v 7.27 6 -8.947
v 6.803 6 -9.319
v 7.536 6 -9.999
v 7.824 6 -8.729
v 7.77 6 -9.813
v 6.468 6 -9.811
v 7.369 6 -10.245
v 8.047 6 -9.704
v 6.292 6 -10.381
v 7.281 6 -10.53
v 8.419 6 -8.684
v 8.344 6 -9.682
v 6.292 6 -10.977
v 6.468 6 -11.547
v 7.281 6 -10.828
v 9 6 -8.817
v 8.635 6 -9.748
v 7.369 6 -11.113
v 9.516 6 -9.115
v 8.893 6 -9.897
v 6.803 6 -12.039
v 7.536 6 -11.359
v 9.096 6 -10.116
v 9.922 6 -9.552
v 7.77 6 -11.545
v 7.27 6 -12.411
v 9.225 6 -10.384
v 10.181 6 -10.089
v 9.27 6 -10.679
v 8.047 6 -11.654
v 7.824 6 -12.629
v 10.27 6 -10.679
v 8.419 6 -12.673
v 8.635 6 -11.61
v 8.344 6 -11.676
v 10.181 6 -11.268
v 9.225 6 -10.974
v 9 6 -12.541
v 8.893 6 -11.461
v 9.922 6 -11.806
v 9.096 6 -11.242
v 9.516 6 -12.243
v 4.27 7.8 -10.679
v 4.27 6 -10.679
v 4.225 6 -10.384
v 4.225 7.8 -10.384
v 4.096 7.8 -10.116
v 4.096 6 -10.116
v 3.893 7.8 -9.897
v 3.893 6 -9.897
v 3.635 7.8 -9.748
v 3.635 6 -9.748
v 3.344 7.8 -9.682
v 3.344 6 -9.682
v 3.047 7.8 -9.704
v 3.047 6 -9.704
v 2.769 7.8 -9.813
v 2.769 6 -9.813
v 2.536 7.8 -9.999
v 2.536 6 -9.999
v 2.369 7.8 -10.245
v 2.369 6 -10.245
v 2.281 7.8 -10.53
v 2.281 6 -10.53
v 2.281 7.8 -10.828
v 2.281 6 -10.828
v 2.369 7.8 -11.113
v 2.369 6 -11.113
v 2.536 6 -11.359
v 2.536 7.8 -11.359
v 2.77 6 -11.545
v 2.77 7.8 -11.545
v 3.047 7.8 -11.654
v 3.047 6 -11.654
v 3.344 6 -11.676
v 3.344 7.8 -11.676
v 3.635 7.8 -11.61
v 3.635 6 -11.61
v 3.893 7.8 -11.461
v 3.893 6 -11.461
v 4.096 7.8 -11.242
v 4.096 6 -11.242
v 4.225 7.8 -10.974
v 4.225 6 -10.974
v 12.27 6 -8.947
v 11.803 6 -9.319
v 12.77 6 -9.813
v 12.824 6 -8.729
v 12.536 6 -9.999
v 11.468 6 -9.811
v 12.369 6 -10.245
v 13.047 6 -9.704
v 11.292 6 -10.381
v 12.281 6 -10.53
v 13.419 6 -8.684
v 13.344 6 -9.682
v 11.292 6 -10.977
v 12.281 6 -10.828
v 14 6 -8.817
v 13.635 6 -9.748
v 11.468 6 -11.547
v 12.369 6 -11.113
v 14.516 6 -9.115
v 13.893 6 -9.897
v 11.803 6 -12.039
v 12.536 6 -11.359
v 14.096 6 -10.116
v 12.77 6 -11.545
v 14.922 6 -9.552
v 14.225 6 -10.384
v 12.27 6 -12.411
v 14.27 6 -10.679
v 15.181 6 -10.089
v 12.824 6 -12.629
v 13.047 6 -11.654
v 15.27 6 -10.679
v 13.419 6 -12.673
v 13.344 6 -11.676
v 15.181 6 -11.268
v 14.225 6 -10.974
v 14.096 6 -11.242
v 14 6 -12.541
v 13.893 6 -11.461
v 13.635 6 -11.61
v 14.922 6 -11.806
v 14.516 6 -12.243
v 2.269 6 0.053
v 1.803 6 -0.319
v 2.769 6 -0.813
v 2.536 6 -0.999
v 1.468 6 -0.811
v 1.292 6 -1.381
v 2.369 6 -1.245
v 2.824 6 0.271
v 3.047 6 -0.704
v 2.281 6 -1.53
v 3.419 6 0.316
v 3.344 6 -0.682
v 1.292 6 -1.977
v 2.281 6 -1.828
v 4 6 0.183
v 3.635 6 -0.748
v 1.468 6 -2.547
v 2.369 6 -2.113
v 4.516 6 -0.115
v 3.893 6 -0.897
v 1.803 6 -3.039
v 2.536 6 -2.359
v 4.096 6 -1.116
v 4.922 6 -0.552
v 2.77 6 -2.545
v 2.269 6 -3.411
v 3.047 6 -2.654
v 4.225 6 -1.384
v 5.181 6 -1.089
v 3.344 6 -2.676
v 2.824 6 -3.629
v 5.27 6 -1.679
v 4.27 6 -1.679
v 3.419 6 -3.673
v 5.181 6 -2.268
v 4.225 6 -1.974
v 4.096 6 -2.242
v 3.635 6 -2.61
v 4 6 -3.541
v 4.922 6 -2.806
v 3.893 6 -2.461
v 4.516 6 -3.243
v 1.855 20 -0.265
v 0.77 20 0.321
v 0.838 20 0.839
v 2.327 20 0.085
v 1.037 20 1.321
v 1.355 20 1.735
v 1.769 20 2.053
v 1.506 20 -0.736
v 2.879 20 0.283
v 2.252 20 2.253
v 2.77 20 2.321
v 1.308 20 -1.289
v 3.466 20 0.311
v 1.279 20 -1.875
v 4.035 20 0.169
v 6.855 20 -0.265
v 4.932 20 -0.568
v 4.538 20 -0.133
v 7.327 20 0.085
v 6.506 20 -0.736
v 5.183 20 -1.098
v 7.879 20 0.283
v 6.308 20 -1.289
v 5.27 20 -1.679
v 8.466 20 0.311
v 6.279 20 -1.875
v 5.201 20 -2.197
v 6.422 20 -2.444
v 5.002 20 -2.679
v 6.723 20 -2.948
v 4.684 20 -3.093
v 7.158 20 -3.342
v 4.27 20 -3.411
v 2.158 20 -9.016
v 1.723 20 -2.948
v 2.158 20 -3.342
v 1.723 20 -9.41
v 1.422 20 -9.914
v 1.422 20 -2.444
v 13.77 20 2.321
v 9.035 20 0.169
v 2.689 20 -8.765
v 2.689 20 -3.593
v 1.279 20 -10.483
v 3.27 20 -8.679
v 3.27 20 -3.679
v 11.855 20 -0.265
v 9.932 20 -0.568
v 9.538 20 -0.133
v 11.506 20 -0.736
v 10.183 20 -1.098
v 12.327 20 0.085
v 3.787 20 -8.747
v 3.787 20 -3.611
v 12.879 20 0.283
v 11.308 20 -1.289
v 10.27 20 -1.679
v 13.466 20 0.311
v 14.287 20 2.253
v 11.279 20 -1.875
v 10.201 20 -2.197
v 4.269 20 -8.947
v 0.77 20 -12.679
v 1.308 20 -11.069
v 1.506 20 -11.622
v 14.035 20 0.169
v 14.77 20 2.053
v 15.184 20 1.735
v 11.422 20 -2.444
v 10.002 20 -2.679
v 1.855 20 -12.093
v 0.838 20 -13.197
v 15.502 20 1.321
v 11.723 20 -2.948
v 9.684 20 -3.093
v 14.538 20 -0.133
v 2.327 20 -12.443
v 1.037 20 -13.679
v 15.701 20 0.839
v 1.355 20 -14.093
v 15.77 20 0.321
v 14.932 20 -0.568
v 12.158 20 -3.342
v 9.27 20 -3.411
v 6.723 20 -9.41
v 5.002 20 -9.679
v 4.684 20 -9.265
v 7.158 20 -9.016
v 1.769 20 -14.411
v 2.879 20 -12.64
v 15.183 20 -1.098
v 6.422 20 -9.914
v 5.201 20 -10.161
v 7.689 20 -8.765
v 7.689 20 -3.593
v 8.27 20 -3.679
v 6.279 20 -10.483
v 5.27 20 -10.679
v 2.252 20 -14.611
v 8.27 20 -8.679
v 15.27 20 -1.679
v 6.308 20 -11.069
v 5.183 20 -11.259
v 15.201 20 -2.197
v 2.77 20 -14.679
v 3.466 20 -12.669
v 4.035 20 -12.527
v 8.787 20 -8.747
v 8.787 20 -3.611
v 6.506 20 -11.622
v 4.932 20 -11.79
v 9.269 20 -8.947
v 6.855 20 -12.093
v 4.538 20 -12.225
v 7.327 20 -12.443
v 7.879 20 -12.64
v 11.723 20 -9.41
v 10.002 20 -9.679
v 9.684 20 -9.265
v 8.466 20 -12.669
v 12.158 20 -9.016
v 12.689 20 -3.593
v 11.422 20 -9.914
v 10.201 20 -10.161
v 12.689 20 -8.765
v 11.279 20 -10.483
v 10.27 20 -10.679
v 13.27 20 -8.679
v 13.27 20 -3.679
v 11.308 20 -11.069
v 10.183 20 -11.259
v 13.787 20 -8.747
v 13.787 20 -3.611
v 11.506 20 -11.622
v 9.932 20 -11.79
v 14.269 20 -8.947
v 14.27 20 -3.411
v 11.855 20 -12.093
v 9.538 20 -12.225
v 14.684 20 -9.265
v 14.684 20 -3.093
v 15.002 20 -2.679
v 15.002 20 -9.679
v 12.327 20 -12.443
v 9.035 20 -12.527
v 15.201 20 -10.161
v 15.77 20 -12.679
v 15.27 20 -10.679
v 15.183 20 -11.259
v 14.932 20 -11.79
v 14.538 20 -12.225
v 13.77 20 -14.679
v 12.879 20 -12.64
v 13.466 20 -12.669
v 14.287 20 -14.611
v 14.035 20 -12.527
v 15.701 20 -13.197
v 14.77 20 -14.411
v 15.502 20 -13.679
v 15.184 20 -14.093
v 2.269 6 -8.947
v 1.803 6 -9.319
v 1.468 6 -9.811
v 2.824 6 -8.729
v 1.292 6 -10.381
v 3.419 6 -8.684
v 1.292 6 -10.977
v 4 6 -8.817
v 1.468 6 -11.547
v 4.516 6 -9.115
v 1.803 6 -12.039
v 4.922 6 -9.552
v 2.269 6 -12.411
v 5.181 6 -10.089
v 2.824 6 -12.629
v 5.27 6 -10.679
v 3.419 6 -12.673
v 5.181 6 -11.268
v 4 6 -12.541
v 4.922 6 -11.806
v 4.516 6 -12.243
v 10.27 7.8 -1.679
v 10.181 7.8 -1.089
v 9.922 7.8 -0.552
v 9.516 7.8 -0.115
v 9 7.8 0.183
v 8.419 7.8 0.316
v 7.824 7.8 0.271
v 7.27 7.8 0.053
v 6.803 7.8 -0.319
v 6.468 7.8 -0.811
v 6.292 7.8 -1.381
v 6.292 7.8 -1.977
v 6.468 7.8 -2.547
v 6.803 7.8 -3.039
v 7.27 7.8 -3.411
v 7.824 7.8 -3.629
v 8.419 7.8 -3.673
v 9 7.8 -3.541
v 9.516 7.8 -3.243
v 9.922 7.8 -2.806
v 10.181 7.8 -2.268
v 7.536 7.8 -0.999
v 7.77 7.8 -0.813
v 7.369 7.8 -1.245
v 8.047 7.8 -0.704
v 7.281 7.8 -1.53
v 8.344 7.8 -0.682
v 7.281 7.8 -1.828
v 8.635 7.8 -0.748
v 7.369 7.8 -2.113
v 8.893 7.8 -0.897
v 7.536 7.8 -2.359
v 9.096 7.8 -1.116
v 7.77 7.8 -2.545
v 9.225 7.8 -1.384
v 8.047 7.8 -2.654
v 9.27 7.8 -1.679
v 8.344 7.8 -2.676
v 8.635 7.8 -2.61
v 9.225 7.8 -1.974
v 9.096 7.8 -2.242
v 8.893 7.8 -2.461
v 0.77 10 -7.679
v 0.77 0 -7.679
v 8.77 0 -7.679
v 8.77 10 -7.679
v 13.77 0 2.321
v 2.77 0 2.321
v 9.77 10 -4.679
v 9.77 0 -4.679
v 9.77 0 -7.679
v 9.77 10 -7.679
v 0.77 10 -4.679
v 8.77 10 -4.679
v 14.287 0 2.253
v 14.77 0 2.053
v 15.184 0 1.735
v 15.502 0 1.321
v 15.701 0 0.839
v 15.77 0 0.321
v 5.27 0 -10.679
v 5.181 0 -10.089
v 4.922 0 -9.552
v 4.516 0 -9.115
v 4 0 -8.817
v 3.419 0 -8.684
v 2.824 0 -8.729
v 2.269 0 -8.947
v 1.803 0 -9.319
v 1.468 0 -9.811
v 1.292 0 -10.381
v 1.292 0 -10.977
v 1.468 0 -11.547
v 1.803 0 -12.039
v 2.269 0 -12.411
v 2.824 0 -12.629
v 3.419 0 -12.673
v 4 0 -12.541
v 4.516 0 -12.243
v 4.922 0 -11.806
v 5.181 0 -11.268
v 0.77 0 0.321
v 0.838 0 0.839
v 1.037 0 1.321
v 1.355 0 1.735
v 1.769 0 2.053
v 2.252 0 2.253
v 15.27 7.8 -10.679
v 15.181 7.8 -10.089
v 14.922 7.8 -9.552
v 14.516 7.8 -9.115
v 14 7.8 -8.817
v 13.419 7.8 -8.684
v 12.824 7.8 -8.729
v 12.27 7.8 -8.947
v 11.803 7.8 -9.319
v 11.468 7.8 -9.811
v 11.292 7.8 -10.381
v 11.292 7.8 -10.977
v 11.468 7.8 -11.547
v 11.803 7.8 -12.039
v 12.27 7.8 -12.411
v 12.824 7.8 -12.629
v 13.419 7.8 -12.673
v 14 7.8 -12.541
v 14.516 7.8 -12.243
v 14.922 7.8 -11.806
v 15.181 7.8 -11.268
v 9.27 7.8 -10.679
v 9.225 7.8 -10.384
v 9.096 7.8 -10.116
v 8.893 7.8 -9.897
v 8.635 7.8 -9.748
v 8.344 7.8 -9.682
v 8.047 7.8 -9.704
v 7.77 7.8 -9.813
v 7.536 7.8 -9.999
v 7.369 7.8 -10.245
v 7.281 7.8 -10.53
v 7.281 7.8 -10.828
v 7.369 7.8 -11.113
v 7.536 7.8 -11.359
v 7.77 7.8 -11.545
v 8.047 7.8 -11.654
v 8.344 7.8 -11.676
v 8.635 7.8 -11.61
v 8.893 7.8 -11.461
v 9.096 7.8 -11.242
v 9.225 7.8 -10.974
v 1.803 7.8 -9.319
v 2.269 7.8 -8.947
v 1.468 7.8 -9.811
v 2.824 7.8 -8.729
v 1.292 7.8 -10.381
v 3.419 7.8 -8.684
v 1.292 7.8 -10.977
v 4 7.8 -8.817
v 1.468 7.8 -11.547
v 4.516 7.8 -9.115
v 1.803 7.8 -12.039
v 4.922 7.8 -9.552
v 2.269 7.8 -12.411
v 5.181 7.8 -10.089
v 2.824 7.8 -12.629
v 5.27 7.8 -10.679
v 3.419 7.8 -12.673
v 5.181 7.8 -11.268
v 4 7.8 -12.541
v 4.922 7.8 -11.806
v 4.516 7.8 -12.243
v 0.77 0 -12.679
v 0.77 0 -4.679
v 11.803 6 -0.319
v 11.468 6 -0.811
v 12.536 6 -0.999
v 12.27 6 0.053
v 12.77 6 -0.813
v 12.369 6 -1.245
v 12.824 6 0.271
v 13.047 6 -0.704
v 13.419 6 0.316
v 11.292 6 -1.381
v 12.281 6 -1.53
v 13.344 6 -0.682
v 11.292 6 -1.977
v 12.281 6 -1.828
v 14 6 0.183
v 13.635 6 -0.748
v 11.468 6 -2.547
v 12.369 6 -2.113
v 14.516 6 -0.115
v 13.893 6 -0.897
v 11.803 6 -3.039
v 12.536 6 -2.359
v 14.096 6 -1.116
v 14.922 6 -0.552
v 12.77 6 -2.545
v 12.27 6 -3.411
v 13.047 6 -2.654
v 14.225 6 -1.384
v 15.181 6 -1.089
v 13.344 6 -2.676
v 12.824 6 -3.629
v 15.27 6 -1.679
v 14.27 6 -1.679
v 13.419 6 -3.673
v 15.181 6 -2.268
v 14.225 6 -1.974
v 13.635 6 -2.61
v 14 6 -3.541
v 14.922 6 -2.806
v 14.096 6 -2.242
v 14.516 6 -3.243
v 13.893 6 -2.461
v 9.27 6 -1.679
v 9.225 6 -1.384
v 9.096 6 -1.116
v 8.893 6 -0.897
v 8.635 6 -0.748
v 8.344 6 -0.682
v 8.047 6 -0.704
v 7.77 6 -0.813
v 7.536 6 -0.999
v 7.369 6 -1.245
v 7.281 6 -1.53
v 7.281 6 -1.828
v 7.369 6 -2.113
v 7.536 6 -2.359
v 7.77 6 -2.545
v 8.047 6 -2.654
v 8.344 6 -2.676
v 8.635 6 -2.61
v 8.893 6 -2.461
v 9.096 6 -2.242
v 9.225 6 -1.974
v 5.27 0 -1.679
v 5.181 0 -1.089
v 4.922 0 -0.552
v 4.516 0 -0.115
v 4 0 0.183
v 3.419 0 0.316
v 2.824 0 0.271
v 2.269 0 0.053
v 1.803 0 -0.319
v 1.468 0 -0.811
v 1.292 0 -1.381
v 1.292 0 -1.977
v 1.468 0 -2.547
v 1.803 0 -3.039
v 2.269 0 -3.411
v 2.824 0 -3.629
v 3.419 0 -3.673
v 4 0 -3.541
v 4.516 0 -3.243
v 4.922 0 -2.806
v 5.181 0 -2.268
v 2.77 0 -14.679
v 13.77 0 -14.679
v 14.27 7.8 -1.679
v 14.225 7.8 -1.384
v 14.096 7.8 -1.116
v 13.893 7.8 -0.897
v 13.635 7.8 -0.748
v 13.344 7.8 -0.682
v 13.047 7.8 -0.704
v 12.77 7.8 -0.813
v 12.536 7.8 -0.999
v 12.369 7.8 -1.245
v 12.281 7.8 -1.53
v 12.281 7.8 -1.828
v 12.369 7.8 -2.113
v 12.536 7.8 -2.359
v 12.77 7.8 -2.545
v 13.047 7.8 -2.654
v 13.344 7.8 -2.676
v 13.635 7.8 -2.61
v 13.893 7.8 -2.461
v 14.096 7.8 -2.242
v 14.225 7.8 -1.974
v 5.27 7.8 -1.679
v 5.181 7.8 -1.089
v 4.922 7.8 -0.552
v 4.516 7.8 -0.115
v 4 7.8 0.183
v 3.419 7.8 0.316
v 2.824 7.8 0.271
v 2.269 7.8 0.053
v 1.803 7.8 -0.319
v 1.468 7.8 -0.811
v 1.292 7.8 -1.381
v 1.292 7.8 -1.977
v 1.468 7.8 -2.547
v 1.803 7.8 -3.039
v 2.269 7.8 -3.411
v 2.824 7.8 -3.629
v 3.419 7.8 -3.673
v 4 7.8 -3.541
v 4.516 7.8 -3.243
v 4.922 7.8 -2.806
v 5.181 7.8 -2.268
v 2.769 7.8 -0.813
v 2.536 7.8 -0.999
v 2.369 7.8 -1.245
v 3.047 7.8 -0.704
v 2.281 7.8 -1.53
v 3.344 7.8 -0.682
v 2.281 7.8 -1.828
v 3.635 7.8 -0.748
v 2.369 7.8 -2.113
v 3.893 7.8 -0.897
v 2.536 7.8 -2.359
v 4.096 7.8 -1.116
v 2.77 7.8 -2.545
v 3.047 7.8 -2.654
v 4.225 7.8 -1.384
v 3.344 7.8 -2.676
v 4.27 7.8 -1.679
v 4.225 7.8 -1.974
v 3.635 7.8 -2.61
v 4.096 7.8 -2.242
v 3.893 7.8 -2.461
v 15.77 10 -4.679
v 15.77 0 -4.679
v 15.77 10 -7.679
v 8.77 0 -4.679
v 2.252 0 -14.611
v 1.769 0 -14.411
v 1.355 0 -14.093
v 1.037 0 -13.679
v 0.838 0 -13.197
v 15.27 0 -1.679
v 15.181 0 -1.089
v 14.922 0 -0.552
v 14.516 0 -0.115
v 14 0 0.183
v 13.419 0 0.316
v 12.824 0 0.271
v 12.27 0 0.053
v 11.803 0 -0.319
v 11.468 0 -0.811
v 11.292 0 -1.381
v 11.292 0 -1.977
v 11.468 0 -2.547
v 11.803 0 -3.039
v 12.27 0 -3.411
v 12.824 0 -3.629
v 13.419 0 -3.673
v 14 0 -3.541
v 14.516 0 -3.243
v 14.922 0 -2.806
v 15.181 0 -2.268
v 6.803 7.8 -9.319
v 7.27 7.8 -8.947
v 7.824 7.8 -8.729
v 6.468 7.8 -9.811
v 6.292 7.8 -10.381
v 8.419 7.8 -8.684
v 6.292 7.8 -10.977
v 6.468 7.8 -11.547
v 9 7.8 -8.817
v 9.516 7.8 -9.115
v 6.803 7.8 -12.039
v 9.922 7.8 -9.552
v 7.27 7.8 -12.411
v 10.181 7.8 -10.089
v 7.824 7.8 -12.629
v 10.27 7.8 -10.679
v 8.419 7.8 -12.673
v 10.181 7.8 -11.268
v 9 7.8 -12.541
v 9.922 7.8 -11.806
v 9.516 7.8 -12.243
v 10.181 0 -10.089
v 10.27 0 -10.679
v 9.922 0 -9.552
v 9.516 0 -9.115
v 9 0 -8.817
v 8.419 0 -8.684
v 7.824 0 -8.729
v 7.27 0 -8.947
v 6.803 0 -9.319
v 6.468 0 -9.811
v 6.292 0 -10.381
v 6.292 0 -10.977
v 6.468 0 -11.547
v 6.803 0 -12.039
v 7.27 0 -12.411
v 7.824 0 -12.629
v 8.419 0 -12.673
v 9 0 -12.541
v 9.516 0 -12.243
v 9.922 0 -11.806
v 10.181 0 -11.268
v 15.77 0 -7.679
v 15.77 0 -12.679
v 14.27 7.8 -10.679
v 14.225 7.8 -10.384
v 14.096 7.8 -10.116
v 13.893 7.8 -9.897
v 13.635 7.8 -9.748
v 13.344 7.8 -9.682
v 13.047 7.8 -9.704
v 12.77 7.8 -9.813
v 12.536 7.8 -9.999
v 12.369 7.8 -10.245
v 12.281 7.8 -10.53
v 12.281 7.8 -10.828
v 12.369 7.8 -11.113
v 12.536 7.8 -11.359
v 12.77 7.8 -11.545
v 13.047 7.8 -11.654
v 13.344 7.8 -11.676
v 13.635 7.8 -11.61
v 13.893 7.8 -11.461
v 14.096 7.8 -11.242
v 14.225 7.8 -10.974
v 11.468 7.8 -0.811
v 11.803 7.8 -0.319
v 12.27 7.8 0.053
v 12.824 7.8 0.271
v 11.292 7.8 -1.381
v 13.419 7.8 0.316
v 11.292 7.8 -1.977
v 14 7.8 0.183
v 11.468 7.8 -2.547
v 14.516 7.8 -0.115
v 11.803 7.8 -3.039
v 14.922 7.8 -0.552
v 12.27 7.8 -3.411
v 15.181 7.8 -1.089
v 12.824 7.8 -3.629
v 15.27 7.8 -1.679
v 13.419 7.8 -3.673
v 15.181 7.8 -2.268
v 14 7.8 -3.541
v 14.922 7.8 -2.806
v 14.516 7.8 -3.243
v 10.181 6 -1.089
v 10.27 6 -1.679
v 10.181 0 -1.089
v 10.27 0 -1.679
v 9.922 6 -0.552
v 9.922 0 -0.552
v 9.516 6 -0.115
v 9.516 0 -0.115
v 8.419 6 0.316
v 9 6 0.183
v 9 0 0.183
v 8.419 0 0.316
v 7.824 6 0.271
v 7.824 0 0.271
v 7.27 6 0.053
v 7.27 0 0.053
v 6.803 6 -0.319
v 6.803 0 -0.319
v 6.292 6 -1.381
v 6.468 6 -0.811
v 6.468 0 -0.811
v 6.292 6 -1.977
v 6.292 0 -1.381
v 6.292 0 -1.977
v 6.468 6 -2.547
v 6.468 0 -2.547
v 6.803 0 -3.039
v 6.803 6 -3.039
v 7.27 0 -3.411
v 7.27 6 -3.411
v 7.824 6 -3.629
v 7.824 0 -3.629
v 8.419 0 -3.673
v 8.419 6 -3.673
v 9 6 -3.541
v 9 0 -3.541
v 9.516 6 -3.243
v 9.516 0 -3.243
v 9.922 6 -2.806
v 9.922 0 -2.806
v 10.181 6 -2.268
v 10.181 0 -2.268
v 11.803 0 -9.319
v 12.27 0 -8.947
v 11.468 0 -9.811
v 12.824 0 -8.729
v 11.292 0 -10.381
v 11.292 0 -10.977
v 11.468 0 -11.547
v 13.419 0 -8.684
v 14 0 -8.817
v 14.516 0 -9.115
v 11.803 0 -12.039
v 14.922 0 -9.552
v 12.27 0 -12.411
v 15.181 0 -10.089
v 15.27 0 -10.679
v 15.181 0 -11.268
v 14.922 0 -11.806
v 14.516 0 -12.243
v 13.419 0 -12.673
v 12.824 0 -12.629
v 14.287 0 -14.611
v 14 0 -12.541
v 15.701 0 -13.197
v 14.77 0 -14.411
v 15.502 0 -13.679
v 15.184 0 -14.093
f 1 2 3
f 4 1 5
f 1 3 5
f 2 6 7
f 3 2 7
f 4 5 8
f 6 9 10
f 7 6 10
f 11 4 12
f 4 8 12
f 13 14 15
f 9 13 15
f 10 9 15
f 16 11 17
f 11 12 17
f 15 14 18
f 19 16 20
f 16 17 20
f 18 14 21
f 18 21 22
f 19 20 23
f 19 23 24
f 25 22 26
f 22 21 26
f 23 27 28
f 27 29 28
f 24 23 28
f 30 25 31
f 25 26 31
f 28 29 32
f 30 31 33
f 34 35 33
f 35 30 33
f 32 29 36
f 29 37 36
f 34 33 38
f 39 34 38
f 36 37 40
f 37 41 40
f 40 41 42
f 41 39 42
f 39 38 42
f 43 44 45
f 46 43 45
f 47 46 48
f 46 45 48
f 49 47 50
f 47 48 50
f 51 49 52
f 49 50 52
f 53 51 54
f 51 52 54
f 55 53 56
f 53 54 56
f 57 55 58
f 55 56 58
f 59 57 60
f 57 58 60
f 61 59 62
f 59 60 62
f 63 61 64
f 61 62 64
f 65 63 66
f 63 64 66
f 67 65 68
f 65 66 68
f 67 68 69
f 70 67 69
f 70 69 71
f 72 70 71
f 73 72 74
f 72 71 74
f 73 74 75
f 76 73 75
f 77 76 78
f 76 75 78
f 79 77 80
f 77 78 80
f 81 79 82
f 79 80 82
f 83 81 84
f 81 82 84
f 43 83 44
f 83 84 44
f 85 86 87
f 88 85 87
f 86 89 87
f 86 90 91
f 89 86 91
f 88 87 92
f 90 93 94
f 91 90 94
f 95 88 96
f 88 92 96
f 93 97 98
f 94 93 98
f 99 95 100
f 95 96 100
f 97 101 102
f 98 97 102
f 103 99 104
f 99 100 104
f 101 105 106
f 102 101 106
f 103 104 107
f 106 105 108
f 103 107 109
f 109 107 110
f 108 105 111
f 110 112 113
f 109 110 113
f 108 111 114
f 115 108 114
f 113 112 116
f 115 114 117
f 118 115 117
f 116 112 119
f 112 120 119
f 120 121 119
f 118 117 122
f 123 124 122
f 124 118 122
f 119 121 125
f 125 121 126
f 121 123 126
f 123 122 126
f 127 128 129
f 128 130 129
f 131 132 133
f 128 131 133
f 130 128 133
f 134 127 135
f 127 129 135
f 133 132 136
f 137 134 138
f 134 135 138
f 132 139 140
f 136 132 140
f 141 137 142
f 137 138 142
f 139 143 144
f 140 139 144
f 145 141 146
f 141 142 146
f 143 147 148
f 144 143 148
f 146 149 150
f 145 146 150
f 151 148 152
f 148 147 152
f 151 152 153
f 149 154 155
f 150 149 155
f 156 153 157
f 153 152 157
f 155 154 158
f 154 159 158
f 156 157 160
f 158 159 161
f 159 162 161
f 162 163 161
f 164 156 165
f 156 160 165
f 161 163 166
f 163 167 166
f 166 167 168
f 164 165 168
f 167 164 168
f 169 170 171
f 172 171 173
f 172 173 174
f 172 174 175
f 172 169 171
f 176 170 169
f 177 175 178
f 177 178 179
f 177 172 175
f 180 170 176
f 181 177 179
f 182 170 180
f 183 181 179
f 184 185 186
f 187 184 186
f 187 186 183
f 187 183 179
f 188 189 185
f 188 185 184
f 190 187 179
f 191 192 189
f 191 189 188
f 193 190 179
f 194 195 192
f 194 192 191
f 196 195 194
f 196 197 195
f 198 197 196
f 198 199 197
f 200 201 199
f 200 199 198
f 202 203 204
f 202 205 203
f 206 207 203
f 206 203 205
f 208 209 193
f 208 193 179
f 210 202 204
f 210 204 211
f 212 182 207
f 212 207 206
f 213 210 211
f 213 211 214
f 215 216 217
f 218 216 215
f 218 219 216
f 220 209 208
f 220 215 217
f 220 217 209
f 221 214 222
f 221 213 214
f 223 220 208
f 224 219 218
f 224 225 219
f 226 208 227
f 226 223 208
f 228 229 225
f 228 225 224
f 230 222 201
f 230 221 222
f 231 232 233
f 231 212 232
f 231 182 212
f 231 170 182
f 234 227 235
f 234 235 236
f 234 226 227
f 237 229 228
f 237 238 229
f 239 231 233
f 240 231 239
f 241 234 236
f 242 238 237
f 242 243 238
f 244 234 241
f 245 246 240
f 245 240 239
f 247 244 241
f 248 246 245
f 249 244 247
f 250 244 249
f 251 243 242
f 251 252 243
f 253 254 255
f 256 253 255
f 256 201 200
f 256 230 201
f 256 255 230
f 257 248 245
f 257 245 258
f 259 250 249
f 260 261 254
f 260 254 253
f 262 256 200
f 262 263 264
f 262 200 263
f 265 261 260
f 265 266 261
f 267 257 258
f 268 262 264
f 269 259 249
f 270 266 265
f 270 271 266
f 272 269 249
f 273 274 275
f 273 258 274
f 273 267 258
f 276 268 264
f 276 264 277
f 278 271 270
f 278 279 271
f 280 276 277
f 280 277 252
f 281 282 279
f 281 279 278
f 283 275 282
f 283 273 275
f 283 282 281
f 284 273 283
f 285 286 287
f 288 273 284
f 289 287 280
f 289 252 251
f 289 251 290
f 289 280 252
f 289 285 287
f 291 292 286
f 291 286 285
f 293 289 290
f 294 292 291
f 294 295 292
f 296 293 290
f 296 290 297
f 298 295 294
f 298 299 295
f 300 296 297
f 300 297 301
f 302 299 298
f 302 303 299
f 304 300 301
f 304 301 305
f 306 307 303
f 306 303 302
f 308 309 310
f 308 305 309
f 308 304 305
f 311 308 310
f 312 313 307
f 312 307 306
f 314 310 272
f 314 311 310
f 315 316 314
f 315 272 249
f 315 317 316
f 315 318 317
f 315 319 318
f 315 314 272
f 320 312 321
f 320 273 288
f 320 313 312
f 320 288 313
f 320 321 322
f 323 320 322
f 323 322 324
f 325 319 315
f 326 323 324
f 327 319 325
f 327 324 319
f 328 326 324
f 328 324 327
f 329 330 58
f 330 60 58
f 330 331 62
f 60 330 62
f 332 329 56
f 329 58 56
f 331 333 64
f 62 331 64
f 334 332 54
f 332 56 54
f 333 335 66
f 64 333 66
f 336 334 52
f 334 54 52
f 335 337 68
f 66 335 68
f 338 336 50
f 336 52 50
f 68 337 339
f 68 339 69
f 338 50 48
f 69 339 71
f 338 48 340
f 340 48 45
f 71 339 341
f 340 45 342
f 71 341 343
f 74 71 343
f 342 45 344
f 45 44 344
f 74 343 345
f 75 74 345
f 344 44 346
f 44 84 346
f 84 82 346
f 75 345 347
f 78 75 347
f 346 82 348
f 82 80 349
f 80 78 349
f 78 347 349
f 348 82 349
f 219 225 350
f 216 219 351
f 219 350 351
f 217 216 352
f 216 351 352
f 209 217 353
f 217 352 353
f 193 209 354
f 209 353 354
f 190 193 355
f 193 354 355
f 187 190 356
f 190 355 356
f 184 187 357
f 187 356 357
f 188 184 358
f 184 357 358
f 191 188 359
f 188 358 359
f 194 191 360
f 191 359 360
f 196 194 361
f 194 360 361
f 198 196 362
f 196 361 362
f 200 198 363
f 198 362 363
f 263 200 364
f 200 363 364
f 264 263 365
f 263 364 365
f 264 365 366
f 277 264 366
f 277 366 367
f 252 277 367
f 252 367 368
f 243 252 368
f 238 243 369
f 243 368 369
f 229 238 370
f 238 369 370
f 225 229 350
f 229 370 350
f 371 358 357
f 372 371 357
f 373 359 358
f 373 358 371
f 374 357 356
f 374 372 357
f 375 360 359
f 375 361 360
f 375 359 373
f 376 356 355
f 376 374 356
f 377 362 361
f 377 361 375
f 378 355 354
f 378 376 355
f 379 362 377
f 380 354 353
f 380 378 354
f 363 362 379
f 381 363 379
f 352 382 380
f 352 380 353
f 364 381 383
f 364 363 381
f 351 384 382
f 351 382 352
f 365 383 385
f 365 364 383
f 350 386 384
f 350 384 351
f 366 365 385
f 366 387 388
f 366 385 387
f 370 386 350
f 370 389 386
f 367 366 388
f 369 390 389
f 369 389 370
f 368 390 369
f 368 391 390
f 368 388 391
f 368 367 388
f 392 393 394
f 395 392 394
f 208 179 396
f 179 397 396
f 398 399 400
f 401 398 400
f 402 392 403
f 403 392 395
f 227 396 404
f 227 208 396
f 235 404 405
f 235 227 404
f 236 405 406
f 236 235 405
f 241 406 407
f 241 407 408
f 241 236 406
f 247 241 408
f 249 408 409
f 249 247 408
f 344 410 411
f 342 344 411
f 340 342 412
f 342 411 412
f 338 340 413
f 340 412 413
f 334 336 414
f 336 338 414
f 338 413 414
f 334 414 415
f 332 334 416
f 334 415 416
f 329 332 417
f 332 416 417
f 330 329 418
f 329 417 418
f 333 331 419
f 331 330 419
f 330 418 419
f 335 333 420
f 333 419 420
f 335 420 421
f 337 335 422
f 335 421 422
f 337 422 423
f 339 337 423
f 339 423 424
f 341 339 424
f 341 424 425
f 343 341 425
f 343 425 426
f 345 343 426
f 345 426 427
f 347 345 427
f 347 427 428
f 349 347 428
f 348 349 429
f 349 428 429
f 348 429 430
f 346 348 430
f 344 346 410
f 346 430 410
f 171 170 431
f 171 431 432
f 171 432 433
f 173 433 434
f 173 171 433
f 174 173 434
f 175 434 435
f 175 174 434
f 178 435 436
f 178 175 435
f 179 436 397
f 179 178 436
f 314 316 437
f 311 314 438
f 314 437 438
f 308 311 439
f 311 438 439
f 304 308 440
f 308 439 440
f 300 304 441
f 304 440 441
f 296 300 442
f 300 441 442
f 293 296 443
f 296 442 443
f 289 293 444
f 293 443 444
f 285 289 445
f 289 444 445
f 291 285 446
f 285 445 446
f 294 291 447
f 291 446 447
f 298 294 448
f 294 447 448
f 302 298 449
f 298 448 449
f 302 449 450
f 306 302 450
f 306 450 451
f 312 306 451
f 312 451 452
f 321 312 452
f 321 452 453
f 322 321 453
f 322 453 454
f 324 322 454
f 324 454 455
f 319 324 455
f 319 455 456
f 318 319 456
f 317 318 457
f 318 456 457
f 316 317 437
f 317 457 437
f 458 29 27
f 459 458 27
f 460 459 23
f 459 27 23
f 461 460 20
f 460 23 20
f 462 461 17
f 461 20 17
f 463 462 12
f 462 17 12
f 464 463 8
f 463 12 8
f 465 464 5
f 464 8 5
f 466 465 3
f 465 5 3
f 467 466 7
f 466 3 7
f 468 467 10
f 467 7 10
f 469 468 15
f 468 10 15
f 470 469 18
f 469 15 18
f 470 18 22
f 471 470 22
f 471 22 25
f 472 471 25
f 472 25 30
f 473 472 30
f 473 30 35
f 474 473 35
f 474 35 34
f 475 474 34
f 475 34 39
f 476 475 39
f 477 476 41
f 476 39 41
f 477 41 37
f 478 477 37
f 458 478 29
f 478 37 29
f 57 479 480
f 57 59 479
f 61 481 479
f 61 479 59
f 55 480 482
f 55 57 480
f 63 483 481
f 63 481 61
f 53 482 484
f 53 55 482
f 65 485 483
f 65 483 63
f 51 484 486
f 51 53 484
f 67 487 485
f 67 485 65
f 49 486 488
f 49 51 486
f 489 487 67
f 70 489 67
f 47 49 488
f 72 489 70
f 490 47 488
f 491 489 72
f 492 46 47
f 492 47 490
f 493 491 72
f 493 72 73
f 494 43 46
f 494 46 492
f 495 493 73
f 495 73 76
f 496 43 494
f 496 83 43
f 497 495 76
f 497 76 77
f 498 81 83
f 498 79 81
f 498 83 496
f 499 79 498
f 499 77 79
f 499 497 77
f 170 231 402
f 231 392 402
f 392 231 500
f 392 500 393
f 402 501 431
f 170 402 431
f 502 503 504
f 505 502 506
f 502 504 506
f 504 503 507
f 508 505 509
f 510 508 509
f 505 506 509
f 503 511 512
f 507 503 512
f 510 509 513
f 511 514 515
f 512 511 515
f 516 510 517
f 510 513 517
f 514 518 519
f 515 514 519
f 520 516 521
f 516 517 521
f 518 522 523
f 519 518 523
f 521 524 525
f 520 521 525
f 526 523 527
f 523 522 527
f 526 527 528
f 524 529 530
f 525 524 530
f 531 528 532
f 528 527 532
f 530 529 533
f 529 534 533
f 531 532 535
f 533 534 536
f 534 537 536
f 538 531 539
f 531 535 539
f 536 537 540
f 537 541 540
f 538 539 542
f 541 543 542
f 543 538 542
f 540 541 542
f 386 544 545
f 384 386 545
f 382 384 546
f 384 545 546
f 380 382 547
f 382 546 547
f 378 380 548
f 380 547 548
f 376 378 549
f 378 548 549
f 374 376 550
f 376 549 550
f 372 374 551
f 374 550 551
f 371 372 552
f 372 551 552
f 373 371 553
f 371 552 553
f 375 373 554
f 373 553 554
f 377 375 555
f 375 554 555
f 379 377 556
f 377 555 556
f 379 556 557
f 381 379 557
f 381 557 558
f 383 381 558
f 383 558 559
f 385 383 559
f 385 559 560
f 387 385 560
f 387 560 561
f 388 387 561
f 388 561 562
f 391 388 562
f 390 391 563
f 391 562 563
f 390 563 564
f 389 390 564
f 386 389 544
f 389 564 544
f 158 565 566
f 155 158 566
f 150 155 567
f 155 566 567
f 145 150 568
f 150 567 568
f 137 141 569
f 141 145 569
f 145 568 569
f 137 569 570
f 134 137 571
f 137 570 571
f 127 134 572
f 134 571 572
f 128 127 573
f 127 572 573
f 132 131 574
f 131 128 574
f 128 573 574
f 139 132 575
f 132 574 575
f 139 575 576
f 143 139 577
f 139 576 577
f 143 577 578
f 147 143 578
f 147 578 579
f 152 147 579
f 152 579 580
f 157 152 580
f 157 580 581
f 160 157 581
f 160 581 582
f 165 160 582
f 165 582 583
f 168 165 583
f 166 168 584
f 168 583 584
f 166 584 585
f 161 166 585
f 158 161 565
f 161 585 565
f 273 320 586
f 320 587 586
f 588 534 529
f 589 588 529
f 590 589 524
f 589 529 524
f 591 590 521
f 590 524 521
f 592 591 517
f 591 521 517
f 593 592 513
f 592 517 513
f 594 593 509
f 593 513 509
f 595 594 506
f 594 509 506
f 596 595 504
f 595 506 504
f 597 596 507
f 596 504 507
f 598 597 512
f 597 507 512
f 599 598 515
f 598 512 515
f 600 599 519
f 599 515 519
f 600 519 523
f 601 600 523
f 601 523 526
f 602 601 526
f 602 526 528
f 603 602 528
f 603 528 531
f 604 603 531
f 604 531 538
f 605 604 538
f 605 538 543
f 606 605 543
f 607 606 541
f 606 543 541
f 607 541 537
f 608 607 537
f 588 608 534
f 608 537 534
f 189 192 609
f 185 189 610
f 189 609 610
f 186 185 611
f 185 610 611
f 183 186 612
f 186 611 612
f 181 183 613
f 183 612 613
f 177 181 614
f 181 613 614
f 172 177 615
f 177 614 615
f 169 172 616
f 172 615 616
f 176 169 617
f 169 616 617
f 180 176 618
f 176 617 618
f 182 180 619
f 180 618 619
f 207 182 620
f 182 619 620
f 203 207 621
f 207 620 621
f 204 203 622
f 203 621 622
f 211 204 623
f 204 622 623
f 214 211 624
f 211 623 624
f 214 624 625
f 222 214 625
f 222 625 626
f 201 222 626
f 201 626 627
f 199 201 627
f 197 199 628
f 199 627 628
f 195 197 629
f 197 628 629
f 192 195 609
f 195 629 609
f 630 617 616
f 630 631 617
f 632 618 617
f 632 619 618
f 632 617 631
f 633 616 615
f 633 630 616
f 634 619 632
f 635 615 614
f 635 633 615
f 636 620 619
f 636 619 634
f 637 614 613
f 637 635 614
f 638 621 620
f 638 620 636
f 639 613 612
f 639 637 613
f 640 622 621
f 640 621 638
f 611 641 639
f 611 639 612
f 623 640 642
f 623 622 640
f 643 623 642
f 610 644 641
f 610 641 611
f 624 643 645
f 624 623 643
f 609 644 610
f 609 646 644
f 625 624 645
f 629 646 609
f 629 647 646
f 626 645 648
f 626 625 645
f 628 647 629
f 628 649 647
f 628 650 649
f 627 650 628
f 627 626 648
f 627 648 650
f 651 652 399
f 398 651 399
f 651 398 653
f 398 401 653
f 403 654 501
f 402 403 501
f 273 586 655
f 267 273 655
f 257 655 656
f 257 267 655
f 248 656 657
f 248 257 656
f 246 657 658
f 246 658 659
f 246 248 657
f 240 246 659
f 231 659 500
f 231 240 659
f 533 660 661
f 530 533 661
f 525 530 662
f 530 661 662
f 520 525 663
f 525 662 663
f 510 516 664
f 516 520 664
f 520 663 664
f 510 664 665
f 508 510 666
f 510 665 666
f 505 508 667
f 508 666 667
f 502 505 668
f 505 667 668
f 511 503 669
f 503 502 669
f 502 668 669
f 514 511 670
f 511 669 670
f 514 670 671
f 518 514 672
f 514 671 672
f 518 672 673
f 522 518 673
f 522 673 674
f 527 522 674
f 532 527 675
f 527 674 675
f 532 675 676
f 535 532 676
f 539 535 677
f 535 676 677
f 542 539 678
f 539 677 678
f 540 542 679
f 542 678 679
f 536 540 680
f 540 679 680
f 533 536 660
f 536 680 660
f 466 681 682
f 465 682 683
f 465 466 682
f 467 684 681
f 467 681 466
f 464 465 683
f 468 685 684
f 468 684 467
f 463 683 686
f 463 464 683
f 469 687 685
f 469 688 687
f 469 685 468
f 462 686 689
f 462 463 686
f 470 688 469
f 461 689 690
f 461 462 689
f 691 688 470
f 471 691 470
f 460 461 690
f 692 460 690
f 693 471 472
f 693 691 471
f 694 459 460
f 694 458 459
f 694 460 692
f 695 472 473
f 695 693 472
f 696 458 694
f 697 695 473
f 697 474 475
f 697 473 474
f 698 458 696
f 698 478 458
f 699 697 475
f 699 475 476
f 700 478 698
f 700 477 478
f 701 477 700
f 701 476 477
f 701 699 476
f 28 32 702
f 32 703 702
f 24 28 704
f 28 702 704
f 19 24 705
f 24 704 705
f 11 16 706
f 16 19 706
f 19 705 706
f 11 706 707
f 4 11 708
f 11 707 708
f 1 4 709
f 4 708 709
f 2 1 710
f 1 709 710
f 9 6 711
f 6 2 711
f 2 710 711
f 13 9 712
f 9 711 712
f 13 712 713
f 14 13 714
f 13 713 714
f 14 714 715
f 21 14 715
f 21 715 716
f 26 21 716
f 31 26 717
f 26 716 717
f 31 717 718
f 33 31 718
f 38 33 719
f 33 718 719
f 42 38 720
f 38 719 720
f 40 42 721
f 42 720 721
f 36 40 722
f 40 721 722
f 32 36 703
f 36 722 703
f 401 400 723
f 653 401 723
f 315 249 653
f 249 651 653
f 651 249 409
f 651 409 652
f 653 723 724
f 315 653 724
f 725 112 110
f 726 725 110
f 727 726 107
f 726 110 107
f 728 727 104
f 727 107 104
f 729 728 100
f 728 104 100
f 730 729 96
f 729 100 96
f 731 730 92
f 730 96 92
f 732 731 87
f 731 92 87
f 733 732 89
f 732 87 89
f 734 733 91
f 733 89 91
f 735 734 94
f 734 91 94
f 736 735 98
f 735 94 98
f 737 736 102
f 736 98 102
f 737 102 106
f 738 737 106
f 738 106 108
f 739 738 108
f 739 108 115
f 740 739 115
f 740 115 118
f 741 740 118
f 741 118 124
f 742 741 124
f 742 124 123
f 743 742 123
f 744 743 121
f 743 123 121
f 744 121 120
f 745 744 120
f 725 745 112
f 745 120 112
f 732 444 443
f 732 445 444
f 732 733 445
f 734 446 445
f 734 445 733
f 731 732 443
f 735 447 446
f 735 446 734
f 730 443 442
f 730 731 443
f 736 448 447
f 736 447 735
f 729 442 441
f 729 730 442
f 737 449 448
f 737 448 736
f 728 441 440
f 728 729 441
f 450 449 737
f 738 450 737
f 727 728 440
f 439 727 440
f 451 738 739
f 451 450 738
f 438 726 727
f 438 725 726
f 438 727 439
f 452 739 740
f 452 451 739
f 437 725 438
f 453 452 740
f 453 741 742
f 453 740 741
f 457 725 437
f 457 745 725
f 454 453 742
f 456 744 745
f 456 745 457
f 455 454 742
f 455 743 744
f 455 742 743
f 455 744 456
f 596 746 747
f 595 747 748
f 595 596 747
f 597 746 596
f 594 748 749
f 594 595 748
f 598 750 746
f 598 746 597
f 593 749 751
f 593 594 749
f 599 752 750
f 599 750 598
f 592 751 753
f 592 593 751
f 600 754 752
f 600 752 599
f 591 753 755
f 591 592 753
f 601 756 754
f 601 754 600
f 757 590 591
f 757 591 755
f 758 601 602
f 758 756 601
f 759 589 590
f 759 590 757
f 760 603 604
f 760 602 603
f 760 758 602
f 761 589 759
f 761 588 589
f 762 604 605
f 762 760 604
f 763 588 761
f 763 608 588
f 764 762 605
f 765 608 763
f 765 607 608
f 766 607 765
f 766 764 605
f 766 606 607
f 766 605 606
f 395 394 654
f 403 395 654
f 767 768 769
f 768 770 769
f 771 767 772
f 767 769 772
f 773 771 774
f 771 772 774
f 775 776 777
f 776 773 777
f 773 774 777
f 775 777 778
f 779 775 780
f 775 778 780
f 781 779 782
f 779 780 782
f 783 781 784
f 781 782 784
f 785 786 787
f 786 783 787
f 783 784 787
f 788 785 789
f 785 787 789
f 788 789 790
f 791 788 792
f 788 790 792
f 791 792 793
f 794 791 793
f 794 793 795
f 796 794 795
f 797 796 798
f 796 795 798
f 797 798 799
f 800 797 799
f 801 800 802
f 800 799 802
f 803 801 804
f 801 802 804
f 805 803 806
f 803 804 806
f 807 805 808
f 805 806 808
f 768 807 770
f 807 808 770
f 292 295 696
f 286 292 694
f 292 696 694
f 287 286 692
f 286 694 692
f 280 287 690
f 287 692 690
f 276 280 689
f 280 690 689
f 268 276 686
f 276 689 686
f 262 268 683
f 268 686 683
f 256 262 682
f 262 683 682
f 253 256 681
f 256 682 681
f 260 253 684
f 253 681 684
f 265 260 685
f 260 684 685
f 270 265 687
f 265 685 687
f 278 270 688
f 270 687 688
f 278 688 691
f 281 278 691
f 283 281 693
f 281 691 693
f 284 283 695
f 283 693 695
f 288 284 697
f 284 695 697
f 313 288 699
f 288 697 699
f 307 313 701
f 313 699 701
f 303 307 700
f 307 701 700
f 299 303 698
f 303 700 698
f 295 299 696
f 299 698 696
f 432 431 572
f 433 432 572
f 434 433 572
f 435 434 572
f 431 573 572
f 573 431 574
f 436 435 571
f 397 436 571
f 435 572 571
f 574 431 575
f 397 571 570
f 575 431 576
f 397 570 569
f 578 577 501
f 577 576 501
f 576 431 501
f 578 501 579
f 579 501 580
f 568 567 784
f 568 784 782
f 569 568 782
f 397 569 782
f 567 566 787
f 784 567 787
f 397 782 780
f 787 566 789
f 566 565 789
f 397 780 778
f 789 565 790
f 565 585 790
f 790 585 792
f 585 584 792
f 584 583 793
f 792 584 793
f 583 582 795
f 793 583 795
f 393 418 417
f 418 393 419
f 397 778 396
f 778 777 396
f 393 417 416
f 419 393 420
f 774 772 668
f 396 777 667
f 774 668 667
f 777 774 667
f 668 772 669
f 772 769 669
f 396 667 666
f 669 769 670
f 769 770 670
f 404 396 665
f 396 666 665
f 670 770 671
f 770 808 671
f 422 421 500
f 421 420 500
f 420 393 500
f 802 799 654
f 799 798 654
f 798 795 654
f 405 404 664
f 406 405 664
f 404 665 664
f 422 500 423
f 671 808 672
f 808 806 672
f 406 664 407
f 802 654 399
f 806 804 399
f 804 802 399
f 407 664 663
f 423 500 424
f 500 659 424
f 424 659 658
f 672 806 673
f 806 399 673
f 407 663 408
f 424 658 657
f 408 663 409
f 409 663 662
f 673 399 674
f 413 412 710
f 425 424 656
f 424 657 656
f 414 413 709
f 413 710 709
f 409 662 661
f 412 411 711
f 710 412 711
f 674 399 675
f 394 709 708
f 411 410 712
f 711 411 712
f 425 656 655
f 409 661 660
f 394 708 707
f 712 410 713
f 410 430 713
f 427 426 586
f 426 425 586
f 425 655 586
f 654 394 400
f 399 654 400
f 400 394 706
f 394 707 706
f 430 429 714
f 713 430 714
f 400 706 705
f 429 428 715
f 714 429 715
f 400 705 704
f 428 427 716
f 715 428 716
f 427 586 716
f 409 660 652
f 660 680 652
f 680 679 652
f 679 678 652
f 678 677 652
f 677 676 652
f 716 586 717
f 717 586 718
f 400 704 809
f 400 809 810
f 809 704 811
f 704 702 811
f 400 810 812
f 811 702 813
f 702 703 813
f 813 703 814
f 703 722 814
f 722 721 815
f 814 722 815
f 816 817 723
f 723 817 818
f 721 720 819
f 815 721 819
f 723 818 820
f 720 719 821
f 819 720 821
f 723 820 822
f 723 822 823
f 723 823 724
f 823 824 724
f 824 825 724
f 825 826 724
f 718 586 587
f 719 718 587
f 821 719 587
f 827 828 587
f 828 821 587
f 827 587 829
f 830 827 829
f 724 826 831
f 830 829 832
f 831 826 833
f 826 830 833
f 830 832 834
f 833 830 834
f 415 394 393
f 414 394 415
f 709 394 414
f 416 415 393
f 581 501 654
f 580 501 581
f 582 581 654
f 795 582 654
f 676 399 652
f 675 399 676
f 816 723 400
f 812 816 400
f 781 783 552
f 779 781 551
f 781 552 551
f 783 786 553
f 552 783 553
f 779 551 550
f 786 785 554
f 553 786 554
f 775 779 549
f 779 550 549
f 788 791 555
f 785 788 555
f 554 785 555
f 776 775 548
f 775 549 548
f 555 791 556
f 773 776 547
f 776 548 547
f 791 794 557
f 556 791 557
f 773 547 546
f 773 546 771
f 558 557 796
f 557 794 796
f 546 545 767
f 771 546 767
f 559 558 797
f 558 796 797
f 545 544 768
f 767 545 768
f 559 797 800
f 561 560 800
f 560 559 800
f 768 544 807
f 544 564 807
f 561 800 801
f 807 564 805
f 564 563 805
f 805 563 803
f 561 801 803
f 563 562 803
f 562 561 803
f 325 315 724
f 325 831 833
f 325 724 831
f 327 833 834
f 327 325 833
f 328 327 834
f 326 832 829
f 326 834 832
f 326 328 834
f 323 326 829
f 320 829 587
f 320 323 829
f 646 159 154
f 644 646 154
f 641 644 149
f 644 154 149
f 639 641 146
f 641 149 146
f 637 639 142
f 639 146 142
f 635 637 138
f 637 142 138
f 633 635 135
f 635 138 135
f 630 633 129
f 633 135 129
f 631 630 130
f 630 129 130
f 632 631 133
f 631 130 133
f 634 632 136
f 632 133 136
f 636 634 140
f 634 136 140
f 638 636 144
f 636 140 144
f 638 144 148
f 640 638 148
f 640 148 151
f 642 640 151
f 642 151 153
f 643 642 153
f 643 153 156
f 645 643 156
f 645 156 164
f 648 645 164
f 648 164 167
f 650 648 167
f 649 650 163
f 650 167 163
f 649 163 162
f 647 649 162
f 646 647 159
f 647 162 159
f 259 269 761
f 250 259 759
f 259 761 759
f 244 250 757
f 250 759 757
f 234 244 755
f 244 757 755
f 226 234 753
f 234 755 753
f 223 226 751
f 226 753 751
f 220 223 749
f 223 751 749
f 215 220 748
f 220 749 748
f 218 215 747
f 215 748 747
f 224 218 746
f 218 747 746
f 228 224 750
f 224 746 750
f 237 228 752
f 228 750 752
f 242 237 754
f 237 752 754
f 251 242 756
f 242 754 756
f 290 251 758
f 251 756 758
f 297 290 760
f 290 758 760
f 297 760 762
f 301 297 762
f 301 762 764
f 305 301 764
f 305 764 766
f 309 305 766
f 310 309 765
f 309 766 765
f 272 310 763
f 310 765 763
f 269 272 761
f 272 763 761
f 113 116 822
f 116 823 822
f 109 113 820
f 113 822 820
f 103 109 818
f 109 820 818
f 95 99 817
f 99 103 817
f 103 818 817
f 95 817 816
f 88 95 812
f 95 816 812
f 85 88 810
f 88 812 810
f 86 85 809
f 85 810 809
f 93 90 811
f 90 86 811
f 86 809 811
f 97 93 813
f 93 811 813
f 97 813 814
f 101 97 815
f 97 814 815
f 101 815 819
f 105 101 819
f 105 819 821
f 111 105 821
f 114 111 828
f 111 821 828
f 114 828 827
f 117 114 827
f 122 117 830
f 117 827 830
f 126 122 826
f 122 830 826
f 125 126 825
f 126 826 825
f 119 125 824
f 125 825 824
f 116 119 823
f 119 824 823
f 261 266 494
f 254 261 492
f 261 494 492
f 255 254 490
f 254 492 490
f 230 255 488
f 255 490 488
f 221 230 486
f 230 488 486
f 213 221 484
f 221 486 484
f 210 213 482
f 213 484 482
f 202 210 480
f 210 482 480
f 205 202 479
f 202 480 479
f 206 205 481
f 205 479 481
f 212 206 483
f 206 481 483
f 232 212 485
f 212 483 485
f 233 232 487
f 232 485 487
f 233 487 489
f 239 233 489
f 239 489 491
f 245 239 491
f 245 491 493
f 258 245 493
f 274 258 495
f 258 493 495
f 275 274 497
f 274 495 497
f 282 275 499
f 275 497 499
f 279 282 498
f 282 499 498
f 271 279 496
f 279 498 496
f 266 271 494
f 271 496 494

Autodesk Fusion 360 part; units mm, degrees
sketch "Sketch1" plane through (0, 0, 0) normal (0, 1, 0) x (1, 0, 0)
  line L0 (0.7695, -2.3211) -> (15.7695, -2.3211)
  line L1 (15.7695, -2.3211) -> (15.7695, 4.6789)
  line L2 (0.7695, 4.6789) -> (0.7695, -2.3211)
  line L3 (15.7695, 7.6789) -> (15.7695, 14.6789)
  line L4 (0.7695, 14.6789) -> (0.7695, 7.6789)
  line L5 (15.7695, 14.6789) -> (0.7695, 14.6789)
  line L6 (9.7695, 4.6789) -> (9.7695, 7.6789)
  line L7 (8.7695, 7.6789) -> (8.7695, 4.6789)
  circle A0 centre (8.2695, 1.6789) radius 2
  line L8 (15.7695, 4.6789) -> (9.7695, 4.6789)
  line L9 (8.7695, 4.6789) -> (0.7695, 4.6789)
  line L10 (0.7695, 7.6789) -> (8.7695, 7.6789)
  line L11 (9.7695, 7.6789) -> (15.7695, 7.6789)
  circle A1 centre (13.2695, 1.6789) radius 2
  circle A2 centre (3.2695, 1.6789) radius 2
  circle A3 centre (8.2695, 10.6789) radius 2
  circle A4 centre (13.2695, 10.6789) radius 2
  circle A5 centre (3.2695, 10.6789) radius 2
  circle A6 centre (-6.7305, 1.6789) radius 1
  circle A7 centre (-11.7305, 1.6789) radius 1
  circle A8 centre (-16.7305, 1.6789) radius 1
  line L12 (-4.7305, -1.3211) -> (-18.7305, -1.3211)
  line L13 (-18.7305, -1.3211) -> (-18.7305, 3.6789)
  line L14 (-18.7305, 3.6789) -> (-4.7305, 3.6789)
  line L15 (-4.7305, 3.6789) -> (-4.7305, -1.3211)
  circle A9 centre (-6.7305, 10.6789) radius 1
  circle A10 centre (-16.7305, 10.6789) radius 1
  circle A11 centre (-11.7305, 10.6789) radius 1
  line L16 (-4.7305, 8.6789) -> (-18.7305, 8.6789)
  line L17 (-4.7305, 13.6789) -> (-4.7305, 8.6789)
  line L18 (-18.7305, 13.6789) -> (-4.7305, 13.6789)
  line L19 (-18.7305, 8.6789) -> (-18.7305, 13.6789)
  line L20 (20.7695, 3.6789) -> (35.7695, 3.6789)
  line L21 (35.7695, 3.6789) -> (35.7695, 8.6789)
  line L22 (35.7695, 8.6789) -> (20.7695, 8.6789)
  line L23 (20.7695, 8.6789) -> (20.7695, 3.6789)
  dimension "d1" = 15
  dimension "d2" = 7
  dimension "d3" = 15
  dimension "d4" = 7
  dimension "d6" = 6
  dimension "d7" = 4
  dimension "d8" = 4
  dimension "d9" = 4
  dimension "d10" = 5
  dimension "d11" = 5
  dimension "d12" = 4
  dimension "d13" = 2.5
  dimension "d14" = 4
  dimension "d15" = 4
  dimension "d16" = 4
  dimension "d17" = 5
  dimension "d18" = 5
  dimension "d21" = 2
  dimension "d22" = 2
  dimension "d23" = 2
  dimension "d24" = 14
  dimension "d25" = 5
  dimension "d27" = 1
  dimension "d29" = 5
  dimension "d30" = 5
  dimension "d31" = 3
  dimension "d32" = 20.5
  dimension "d33" = 2
  dimension "d34" = 2
  dimension "d35" = 2
  dimension "d36" = 2
  dimension "d37" = 14
  dimension "d38" = 5
  dimension "d39" = 5
  dimension "d40" = 5
  dimension "d41" = 2
  dimension "d42" = 2
  dimension "d43" = 1
  dimension "d49" = 5
  dimension "d50" = 15
  dimension "d51" = 20
extrude "Extrude4" add sketch "Sketch1" along normal blind 20 contours L0 L1 L2 L3 L4 L5 L6 L7 L8 L9 L10 L11 makes body 1
extrude "Extrude5" add sketch "Sketch1" along normal blind 1.8 separate body contours L12 L13 L14 L15 | L16 L17 L18 L19 makes body 2 at (-11.7056, 0, 0.6535) makes body 3 at (-11.7555, 0, -13.0113)
move_body "Move2" bodies 2 3 to x (1, 0, 0) y (0, 1, 0) z (0, 0, 1) at (20, 6, 0)
extrude "Extrude6" add sketch "Sketch1" along normal blind 10 separate body contours L20 L21 L22 L23 makes body 4
move_body "Move4" bodies 4 to x (1, 0, 0) y (0, 1, 0) z (0, 0, 1) at (0, 10, 0)
move_body "Move5" bodies 4 to x (1, 0, 0) y (0, 1, 0) z (0, 0, 1) at (-20, 0, 0)
combine "Combine1" operation add target body 1 tool bodies 3 4 2
fillet "Fillet5" radius 2 1 edges at (15.7695, 10, -14.6789) on bodies 1
fillet "Fillet6" radius 2 1 edges at (0.7695, 10, -14.6789) on bodies 1
fillet "Fillet7" radius 2 1 edges at (0.7695, 10, 2.3211) on bodies 1
fillet "Fillet8" radius 2 1 edges at (15.7695, 10, 2.3211) on bodies 1
